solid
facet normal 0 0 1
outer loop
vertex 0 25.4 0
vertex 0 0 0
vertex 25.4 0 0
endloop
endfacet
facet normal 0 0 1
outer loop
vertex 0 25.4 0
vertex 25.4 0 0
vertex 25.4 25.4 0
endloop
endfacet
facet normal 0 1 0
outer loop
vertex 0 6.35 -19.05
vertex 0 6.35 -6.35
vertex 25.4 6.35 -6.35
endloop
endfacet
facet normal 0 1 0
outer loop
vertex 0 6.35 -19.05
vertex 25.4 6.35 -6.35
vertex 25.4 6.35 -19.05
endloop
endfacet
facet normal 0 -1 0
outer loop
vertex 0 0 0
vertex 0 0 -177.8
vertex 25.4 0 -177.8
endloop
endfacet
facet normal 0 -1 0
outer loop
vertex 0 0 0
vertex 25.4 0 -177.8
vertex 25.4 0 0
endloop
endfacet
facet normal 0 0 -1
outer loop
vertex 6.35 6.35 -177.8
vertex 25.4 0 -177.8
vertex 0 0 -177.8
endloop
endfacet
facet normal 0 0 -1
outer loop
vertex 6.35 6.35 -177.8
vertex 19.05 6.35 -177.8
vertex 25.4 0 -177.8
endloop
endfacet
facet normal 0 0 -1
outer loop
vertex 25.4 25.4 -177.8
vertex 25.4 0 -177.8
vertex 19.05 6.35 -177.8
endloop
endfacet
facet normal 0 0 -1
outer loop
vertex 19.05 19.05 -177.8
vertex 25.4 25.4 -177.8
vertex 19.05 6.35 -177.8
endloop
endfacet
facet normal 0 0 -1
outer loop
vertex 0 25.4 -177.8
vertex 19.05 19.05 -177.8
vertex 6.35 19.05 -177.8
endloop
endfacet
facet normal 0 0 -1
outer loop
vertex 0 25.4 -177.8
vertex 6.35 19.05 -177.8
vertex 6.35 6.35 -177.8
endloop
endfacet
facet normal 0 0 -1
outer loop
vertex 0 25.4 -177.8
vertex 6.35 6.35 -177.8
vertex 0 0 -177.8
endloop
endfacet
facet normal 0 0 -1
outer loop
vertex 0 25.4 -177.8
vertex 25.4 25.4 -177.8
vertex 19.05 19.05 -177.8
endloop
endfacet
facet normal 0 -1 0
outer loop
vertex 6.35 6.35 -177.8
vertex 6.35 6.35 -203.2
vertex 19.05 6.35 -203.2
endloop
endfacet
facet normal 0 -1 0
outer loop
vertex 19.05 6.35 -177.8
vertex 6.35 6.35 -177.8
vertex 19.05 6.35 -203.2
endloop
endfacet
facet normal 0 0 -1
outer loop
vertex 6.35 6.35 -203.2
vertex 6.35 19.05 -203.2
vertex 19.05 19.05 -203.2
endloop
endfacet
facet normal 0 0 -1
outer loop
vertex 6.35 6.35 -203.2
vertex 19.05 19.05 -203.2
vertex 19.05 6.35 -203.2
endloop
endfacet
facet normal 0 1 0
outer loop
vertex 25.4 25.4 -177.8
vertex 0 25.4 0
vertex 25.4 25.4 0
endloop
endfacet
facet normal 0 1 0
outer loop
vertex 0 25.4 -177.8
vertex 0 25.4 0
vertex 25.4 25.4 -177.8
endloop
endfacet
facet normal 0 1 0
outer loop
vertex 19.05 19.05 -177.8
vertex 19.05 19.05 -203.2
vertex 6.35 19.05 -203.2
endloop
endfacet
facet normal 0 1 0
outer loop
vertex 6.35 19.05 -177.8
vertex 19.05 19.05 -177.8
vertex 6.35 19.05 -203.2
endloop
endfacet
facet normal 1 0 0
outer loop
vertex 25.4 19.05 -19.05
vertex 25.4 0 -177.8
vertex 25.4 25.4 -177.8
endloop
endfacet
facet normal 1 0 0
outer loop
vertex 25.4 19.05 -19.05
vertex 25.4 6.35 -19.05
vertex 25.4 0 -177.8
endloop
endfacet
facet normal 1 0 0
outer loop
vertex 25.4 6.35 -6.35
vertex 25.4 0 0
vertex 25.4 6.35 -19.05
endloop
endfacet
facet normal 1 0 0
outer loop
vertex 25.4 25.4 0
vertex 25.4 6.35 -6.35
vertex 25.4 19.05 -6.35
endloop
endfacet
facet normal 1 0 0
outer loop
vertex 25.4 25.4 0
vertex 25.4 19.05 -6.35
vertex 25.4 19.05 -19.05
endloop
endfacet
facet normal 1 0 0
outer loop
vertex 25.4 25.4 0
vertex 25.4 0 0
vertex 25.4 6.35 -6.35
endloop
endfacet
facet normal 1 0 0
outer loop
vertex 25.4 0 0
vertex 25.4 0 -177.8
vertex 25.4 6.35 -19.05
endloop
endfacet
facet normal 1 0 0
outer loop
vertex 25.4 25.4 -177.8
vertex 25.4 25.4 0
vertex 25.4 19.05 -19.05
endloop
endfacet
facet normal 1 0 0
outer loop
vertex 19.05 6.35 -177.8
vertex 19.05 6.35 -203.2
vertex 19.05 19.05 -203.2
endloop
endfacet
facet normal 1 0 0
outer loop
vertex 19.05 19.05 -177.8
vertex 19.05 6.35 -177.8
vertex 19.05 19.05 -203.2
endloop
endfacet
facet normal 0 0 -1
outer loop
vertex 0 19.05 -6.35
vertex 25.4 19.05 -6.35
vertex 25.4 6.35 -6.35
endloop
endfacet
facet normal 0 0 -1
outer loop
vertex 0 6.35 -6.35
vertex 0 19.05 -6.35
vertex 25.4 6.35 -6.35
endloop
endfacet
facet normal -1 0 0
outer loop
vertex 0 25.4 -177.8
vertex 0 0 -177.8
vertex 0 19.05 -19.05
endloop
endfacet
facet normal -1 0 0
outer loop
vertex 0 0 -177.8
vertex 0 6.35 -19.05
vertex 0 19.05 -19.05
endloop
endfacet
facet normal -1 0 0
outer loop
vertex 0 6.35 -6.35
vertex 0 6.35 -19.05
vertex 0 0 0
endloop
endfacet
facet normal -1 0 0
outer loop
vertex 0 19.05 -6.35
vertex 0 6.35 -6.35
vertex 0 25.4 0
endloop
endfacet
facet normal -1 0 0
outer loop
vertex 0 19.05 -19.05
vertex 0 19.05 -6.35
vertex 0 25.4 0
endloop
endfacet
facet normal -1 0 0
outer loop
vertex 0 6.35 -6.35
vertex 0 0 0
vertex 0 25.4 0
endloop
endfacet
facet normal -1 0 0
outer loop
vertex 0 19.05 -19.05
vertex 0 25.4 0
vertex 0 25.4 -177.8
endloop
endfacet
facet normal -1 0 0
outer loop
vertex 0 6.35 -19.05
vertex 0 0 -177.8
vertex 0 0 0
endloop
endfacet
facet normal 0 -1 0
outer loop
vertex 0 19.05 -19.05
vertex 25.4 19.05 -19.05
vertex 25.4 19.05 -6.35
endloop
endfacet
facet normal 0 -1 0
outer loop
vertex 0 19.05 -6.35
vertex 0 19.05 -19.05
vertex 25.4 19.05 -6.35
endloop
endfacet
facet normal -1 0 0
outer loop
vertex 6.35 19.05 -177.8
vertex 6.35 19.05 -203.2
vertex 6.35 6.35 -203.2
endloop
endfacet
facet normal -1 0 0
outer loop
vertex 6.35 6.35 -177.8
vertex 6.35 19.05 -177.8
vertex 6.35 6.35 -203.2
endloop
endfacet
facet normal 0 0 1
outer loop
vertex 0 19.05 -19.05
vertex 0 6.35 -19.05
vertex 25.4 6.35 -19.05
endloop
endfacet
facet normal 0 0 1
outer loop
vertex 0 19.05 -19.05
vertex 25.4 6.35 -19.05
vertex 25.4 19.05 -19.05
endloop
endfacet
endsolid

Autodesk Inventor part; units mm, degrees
ref_plane "YZ Plane" through (0, 0, 0) normal (1, 0, 0) x (0, 1, 0)
ref_plane "XZ Plane" through (0, 0, 0) normal (0, 1, 0) x (-1, 0, 0)
ref_plane "XY Plane" through (0, 0, 0) normal (0, 0, 1) x (1, 0, 0)
sketch "Sketch1" plane through (0, 0, 0) normal (1, 0, 0) x (0, 1, 0)
  line L0 (0, 0) -> (25.4, 0)
  line L1 (25.4, 0) -> (25.4, -203.2)
  line L2 (25.4, -203.2) -> (0, -203.2)
  line L3 (0, -203.2) -> (0, 0)
  line L4 (19.05, -6.35) -> (6.35, -6.35)
  line L5 (6.35, -6.35) -> (6.35, -19.05)
  line L6 (6.35, -19.05) -> (19.05, -19.05)
  line L7 (19.05, -19.05) -> (19.05, -6.35)
  dimension "d0" = 25.4
  dimension "d1" = 203.2
  dimension "d2" = 12.7
  dimension "d3" = 12.7
  dimension "d4" = 6.35
  dimension "d5" = 6.35
extrude "Extrusion1" add sketch "Sketch1" along normal blind 25.4
sketch "Sketch2" plane through (0, 0, -203.2) normal (0, 0, -1) x (-1, 0, 0)
  point P0 (0, 0)
sketch "Sketch3" plane through (0, 0, -203.2) normal (0, 0, -1) x (-1, 0, 0)
  line L0 (-19.05, 19.05) -> (-6.35, 19.05)
  line L1 (-6.35, 19.05) -> (-6.35, 6.35)
  line L2 (-6.35, 6.35) -> (-19.05, 6.35)
  line L3 (-19.05, 6.35) -> (-19.05, 19.05)
  line L4 (0, 25.4) -> (0, 0) projected
  line L5 (0, 25.4) -> (-25.4, 25.4) projected
  line L6 (-25.4, 0) -> (-25.4, 25.4) projected
  line L7 (0, 0) -> (-25.4, 0) projected
  dimension "d8" = 12.7
  dimension "d9" = 12.7
  dimension "d10" = 6.35
  dimension "d11" = 6.35
extrude "Extrusion2" cut sketch "Sketch3" against normal blind 25.4
equation "\"d9\" = d8"
properties part number "FrameAnalysisPart"
